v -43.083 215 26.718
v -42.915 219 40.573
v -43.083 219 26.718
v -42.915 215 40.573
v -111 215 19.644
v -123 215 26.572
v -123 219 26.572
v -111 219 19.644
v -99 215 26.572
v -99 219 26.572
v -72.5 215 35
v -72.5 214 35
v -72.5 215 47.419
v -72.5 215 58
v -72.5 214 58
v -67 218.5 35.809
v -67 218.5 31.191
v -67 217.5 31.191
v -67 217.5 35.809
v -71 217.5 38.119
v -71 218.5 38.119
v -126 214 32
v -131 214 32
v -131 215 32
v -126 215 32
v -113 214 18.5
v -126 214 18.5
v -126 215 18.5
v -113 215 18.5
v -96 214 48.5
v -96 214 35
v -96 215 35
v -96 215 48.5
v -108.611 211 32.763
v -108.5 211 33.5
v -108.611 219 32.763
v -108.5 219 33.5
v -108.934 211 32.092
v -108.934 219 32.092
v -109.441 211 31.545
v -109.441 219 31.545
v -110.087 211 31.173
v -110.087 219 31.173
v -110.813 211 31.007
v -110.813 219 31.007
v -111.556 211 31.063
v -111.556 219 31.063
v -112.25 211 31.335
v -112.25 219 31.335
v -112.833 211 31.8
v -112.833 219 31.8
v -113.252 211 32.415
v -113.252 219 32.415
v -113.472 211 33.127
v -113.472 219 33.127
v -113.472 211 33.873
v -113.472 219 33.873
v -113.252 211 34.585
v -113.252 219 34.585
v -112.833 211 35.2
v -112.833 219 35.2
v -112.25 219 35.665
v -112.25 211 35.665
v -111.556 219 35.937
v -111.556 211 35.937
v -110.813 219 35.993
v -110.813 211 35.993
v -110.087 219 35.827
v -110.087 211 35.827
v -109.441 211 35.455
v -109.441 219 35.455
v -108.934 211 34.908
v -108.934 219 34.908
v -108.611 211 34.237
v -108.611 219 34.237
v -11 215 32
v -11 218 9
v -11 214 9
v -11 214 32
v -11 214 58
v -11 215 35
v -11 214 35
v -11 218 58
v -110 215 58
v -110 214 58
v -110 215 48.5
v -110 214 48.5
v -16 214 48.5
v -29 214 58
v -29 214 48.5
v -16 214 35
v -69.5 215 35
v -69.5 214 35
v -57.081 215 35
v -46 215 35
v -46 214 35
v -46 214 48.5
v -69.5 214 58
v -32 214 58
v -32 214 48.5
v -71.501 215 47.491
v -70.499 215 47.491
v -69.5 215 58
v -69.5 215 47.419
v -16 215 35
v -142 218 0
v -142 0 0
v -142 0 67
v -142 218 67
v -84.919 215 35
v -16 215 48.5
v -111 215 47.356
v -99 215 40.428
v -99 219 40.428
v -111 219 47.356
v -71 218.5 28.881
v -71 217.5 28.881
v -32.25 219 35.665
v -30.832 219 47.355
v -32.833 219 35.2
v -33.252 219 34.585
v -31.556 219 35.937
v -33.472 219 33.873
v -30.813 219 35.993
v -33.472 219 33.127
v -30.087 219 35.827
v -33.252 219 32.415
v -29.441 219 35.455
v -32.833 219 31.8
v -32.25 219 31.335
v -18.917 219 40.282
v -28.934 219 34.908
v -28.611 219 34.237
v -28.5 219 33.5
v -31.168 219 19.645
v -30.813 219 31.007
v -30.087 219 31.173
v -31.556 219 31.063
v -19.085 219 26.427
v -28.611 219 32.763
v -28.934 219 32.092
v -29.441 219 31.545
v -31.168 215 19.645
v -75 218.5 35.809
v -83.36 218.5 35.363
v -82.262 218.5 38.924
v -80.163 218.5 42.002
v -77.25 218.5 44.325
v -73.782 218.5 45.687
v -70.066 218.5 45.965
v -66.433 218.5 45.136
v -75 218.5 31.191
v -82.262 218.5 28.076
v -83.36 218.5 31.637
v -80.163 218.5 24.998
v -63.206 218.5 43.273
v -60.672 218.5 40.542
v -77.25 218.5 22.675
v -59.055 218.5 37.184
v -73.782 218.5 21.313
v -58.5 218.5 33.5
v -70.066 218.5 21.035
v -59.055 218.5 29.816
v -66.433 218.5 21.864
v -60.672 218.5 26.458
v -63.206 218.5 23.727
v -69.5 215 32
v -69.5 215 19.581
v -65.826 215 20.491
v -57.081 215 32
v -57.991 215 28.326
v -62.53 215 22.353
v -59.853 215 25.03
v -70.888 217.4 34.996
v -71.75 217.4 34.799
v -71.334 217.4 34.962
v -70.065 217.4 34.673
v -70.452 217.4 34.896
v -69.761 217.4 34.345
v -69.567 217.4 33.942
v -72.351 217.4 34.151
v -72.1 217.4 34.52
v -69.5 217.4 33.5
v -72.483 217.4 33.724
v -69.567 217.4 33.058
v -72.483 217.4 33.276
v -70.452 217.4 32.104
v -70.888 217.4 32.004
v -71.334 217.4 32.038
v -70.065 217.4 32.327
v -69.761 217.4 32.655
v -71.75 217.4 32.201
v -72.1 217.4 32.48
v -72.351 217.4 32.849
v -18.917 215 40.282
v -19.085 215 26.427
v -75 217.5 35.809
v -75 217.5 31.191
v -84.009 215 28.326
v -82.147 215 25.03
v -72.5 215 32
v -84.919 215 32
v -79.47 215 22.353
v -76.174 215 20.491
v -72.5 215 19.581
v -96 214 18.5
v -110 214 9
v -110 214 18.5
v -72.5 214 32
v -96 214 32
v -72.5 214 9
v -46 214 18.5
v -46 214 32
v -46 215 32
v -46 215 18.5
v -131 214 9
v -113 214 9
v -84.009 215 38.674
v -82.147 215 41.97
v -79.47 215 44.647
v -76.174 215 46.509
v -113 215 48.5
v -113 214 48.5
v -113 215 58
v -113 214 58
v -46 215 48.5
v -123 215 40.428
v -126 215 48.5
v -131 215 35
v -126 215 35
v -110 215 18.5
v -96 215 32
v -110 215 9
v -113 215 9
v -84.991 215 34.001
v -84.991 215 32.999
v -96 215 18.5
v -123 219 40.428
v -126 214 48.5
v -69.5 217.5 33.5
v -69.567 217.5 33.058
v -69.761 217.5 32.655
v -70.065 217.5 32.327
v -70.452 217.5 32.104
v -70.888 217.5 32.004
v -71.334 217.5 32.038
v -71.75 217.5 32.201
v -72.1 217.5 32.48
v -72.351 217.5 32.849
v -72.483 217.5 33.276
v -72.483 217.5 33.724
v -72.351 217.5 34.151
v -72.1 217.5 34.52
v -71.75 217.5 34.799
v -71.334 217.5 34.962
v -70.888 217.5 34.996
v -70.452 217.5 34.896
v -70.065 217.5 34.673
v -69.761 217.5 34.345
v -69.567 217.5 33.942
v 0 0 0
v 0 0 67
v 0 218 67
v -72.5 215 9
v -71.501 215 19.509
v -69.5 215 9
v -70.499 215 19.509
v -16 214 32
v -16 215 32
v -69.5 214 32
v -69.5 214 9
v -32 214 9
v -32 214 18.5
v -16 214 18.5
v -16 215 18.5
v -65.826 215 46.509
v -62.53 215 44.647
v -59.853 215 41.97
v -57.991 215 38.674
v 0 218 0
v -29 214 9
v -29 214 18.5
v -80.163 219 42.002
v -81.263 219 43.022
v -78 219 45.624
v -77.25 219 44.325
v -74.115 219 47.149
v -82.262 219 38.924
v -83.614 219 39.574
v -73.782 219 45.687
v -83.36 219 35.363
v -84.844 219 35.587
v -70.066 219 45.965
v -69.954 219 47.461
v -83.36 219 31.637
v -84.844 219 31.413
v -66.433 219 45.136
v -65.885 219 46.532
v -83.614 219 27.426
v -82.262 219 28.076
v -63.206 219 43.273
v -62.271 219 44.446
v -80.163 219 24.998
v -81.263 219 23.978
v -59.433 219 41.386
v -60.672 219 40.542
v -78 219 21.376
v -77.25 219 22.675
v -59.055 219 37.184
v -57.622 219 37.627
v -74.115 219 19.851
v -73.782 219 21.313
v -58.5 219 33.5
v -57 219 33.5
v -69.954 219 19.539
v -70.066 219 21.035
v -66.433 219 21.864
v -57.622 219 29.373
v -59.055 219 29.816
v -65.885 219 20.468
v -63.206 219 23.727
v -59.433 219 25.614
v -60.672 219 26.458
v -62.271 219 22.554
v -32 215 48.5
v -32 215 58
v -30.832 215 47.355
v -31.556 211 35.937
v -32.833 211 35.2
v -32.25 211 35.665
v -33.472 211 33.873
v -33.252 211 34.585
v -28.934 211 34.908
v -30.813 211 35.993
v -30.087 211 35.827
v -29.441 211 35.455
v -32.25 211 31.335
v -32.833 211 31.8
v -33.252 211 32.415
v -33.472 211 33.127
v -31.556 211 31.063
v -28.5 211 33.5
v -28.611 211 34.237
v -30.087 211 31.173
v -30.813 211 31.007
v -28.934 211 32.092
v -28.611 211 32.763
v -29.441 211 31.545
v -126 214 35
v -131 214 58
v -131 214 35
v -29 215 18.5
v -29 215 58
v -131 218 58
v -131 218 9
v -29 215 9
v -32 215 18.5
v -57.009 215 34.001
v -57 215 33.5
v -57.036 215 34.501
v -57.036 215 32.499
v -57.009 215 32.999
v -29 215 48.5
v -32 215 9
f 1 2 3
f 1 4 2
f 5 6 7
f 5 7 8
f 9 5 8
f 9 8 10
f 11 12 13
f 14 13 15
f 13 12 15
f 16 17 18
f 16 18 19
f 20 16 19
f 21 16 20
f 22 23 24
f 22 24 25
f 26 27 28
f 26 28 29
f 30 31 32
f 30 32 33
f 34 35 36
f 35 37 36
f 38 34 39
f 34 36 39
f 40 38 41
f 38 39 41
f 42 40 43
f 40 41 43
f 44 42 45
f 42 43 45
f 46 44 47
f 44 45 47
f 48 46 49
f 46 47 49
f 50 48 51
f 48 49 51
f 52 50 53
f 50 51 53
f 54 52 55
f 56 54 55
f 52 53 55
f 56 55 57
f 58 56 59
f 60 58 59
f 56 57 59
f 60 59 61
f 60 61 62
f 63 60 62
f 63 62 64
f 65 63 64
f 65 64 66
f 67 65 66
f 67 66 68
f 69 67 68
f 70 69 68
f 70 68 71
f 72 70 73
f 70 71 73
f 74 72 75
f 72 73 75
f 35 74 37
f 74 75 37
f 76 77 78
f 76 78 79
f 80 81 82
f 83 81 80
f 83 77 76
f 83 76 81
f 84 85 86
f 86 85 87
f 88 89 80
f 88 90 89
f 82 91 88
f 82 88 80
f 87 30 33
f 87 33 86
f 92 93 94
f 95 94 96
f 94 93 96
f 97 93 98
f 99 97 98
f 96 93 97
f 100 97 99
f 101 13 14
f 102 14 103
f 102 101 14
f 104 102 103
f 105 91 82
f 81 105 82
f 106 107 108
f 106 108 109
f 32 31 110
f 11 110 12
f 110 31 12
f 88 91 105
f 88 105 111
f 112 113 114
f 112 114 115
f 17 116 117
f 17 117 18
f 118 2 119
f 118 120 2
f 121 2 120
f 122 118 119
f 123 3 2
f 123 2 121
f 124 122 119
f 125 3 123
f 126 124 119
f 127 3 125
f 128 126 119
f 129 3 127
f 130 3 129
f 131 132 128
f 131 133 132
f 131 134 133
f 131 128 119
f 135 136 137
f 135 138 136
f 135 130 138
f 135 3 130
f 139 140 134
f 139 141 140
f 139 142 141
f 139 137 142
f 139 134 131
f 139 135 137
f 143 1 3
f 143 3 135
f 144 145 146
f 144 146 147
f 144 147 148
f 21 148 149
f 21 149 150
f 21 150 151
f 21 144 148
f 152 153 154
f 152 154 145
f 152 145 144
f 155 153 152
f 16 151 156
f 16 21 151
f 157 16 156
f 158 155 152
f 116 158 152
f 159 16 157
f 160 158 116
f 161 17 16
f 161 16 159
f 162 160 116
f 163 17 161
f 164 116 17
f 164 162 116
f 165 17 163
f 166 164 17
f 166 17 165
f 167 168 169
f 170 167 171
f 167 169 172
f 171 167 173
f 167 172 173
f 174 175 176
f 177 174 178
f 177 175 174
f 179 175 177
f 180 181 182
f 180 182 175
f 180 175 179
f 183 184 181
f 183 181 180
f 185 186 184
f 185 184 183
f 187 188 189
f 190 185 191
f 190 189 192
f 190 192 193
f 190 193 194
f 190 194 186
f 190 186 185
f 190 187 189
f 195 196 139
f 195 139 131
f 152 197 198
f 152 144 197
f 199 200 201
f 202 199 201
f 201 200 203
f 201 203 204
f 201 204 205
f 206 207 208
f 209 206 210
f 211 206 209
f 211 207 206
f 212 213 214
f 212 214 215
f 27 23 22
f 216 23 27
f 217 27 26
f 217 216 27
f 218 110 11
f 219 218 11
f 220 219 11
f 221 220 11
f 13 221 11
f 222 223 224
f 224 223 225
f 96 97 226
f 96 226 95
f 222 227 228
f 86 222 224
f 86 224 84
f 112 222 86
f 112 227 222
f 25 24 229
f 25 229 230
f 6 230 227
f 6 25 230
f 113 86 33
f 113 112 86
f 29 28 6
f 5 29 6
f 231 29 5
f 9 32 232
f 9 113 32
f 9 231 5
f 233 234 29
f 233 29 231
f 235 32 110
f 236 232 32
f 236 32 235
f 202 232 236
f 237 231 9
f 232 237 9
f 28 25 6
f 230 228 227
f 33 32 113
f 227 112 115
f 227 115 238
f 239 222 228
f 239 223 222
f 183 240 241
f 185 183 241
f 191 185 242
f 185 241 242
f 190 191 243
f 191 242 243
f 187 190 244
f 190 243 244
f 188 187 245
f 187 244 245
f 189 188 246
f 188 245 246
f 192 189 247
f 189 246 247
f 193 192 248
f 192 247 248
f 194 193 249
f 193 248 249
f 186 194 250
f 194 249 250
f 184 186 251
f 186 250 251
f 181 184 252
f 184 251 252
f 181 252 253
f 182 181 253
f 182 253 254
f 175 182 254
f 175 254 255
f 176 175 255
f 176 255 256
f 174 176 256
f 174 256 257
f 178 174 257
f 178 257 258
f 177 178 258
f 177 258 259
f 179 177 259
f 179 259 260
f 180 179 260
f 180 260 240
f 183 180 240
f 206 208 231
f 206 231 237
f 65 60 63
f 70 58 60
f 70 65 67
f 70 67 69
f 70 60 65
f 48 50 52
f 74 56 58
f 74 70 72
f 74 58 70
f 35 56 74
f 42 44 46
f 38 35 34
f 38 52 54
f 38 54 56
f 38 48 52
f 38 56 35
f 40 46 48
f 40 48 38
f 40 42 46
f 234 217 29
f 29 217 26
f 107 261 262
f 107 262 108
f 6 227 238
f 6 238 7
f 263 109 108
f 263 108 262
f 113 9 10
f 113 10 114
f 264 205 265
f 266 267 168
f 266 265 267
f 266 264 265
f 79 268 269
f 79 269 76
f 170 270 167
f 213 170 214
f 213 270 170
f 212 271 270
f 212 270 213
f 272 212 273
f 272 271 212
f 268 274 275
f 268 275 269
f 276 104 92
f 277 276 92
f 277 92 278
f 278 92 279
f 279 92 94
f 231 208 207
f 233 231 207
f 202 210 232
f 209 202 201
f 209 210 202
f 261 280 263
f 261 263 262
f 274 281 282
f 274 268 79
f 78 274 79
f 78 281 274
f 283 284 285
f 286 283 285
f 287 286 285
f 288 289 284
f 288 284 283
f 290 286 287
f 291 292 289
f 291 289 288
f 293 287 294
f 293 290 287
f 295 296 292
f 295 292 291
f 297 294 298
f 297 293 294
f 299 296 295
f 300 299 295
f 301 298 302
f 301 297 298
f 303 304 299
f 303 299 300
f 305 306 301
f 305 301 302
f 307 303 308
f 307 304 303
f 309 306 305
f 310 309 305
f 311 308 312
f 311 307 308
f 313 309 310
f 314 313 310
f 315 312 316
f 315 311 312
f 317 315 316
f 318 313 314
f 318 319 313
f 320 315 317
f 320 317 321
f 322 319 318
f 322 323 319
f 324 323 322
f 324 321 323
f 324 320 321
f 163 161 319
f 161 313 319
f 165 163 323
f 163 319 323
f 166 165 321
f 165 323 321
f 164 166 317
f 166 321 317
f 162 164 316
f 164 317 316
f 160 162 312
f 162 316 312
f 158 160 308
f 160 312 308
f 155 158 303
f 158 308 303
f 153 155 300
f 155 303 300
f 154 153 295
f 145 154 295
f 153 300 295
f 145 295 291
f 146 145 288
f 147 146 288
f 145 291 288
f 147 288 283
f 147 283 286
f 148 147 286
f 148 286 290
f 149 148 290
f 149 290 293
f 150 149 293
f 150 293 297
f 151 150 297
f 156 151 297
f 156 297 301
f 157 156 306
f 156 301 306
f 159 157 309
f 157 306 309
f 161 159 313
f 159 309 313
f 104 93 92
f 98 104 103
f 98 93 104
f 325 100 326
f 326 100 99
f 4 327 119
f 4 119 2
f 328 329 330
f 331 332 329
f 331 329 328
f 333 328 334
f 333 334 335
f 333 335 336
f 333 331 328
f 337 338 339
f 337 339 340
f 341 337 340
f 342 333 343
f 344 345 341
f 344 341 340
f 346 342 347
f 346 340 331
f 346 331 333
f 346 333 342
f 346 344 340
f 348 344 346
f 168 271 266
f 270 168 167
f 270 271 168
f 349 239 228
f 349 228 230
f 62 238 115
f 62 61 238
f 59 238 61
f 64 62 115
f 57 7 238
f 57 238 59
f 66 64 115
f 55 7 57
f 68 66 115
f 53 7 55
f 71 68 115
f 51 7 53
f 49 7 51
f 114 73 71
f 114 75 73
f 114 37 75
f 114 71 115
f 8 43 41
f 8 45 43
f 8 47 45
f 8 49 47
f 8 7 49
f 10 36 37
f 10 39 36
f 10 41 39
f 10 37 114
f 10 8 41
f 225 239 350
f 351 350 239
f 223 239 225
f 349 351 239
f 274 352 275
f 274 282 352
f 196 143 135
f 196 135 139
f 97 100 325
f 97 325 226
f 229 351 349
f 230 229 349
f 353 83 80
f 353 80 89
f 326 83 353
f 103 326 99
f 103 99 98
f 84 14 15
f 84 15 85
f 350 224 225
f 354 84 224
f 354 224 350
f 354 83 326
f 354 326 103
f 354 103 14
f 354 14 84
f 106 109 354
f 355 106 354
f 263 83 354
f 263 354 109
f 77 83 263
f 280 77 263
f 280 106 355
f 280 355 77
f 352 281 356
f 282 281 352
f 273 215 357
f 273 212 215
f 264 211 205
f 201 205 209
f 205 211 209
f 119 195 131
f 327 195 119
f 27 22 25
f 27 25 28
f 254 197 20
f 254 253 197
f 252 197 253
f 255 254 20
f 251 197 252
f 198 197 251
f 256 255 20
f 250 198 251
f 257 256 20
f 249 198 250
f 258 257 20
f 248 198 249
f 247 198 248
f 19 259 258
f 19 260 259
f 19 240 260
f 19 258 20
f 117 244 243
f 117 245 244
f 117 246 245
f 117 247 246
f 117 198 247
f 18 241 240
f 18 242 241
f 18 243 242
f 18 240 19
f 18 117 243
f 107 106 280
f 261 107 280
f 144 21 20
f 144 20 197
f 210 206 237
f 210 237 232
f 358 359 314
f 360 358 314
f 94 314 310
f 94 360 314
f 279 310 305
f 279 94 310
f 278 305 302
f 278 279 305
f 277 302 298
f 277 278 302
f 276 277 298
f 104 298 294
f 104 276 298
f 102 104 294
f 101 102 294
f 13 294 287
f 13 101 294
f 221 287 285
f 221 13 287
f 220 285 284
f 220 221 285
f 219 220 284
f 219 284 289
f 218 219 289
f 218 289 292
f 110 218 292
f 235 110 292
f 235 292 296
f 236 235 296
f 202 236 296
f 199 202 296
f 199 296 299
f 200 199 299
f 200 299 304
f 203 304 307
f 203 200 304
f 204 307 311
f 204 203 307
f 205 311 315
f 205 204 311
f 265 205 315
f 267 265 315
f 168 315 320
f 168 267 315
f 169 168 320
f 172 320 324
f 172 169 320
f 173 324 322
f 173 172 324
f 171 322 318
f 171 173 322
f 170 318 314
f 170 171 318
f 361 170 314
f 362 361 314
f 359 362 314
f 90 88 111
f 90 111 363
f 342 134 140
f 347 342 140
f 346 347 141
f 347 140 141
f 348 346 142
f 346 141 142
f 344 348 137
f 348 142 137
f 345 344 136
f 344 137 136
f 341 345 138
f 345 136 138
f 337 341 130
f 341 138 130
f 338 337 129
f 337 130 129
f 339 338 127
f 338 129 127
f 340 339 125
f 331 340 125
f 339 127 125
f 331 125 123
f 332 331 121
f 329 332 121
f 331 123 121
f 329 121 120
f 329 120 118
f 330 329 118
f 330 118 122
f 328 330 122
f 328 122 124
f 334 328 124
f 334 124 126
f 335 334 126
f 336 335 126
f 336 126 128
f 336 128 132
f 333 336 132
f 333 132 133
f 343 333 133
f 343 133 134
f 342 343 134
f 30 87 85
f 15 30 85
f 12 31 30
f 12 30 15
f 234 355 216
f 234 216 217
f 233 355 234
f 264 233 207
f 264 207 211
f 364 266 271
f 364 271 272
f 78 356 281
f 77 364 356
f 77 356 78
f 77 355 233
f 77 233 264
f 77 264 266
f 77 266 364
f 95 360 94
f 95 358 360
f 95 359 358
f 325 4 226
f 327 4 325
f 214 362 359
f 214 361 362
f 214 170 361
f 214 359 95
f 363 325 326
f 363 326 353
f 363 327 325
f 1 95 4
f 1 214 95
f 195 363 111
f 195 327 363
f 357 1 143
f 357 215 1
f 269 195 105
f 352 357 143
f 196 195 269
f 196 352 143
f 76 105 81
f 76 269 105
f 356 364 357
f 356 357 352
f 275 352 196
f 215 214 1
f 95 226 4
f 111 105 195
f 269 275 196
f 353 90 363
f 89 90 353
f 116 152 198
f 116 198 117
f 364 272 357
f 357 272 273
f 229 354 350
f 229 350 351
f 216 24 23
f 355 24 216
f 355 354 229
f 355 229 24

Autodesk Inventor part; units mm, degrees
ref_plane "YZ Plane" through (0, 0, 0) normal (1, 0, 0) x (0, 1, 0)
ref_plane "XZ Plane" through (0, 0, 0) normal (0, 1, 0) x (-1, 0, 0)
ref_plane "XY Plane" through (0, 0, 0) normal (0, 0, 1) x (1, 0, 0)
sketch "Sketch1" plane through (0, 0, 0) normal (0, 0, 1) x (1, 0, 0)
  line L0 (0, 0) -> (-142, 0)
  line L1 (-142, 0) -> (-142, 218)
  line L2 (-142, 218) -> (0, 218)
  line L3 (0, 218) -> (0, 0)
  dimension "d0" = 142
  dimension "d1" = 218
extrude "Extrusion1" add sketch "Sketch1" along normal blind 67
sketch "Sketch6" plane through (-142, 218, 0) normal (0, 1, 0) x (1, 0, 0)
  line L0 (0, -67) -> (142, -67) projected
  line L1 (142, 0) -> (142, -67) projected
  line L2 (0, 0) -> (142, 0) projected
  line L3 (0, 0) -> (0, -67) projected
  line L4 (11, -9) -> (131, -9)
  line L5 (131, -9) -> (131, -58)
  line L6 (131, -58) -> (11, -58)
  line L7 (11, -58) -> (11, -9)
  dimension "d33" = 67
  dimension "d34" = 142
  dimension "d35" = 11
  dimension "d36" = 11
  dimension "d37" = 9
  dimension "d38" = 9
extrude "Extrusion5" cut sketch "Sketch6" against normal blind 4 contours L4 L5 L6 L7
sketch "Sketch7" plane through (-142, 214, 0) normal (0, 1, 0) x (1, 0, 0)
  line L0 (11, -58) -> (131, -58) projected
  line L1 (131, -58) -> (131, -9) projected
  line L2 (11, -9) -> (131, -9)
  line L3 (131, -9) -> (131, -58)
  line L4 (131, -58) -> (11, -58)
  line L5 (11, -58) -> (11, -9)
  line L6 (11, -9) -> (11, -32)
  line L7 (11, -32) -> (11, -35)
  line L8 (11, -35) -> (11, -58)
  line L9 (11, -32) -> (16, -32)
  line L10 (11, -35) -> (16, -35)
  line L11 (11, -9) -> (29, -9)
  line L12 (29, -9) -> (32, -9)
  line L13 (32, -9) -> (69.5, -9)
  line L14 (69.5, -9) -> (72.5, -9)
  line L15 (72.5, -9) -> (110, -9)
  line L16 (131, -9) -> (113, -9)
  line L17 (113, -9) -> (110, -9)
  line L18 (29, -9) -> (29, -18.5)
  line L19 (32, -18.5) -> (32, -9)
  line L20 (29, -9) -> (32, -9)
  line L21 (32, -58) -> (32, -48.5)
  line L22 (29, -48.5) -> (29, -58)
  line L23 (16, -48.5) -> (16, -35)
  line L24 (16, -32) -> (16, -18.5)
  line L25 (16, -18.5) -> (29, -18.5)
  line L26 (32, -18.5) -> (46, -18.5)
  line L27 (46, -18.5) -> (46, -32)
  line L28 (46, -35) -> (46, -48.5)
  line L29 (69.5, -9) -> (69.5, -32)
  line L30 (69.5, -35) -> (69.5, -58)
  line L31 (72.5, -9) -> (72.5, -32)
  line L32 (72.5, -35) -> (72.5, -58)
  line L33 (46, -32) -> (69.5, -32)
  line L34 (46, -35) -> (69.5, -35)
  line L35 (72.5, -35) -> (96, -35)
  line L36 (126, -35) -> (131, -35)
  line L37 (110, -9) -> (110, -18.5)
  line L38 (110, -48.5) -> (110, -58)
  line L39 (72.5, -32) -> (96, -32)
  line L40 (126, -32) -> (131, -32)
  line L41 (113, -9) -> (113, -18.5)
  line L42 (110, -58) -> (110, -48.5)
  line L43 (110, -18.5) -> (110, -9)
  line L44 (113, -48.5) -> (113, -58)
  line L45 (126, -48.5) -> (113, -48.5)
  line L46 (110, -48.5) -> (96, -48.5)
  line L47 (126, -18.5) -> (126, -32)
  line L48 (126, -35) -> (126, -48.5)
  line L49 (96, -48.5) -> (96, -35)
  line L50 (96, -32) -> (96, -18.5)
  line L51 (96, -18.5) -> (110, -18.5)
  line L52 (113, -18.5) -> (126, -18.5)
  line L53 (46, -48.5) -> (32, -48.5)
  line L54 (29, -48.5) -> (16, -48.5)
  line L55 (11, -32) -> (16, -32)
  line L56 (16, -18.5) -> (29, -18.5)
  line L57 (29, -9) -> (32, -9)
  line L58 (32, -18.5) -> (46, -18.5)
  line L59 (46, -32) -> (69.5, -32)
  line L60 (69.5, -9) -> (72.5, -9)
  line L61 (72.5, -32) -> (96, -32)
  line L62 (96, -18.5) -> (110, -18.5)
  line L63 (110, -9) -> (113, -9)
  line L64 (113, -18.5) -> (126, -18.5)
  line L65 (126, -32) -> (131, -32)
  line L66 (131, -35) -> (126, -35)
  line L67 (126, -48.5) -> (113, -48.5)
  line L68 (113, -58) -> (110, -58)
  line L69 (110, -48.5) -> (96, -48.5)
  line L70 (96, -35) -> (72.5, -35)
  line L71 (72.5, -58) -> (69.5, -58)
  line L72 (69.5, -35) -> (46, -35)
  line L73 (46, -48.5) -> (32, -48.5)
  line L74 (32, -58) -> (29, -58)
  line L75 (29, -48.5) -> (16, -48.5)
  line L76 (16, -35) -> (11, -35)
  point P0 (142, 0)
extrude "Extrusion6" add sketch "Sketch7" along normal blind 1 contours L22 L54 L23 L10 L5 L9 L24 L25 L18 L2 L19 L26 L27 L33 L29 L31 L39 L50 L51 L37 L41 L52 L47 L40 L1 L36 L48 L45 L44 L0 L38 L46 L49 L35 L32 L30 L34 L28 L53 L21
sketch "Sketch8" plane through (-142, 215, 0) normal (0, 1, 0) x (1, 0, 0)
  line L0 (126, -18.5) -> (126, -32) projected
  line L1 (113, -18.5) -> (126, -18.5) projected
  line L2 (32, -18.5) -> (46, -18.5) projected
  line L3 (16, -32) -> (16, -18.5) projected
  line L4 (31, -47.3564) -> (19, -40.4282)
  line L5 (19, -40.4282) -> (19, -26.5718)
  line L6 (19, -26.5718) -> (31, -19.6436)
  line L7 (31, -19.6436) -> (43, -26.5718)
  line L8 (43, -26.5718) -> (43, -40.4282)
  line L9 (43, -40.4282) -> (31, -47.3564)
  line L10 (110.8321, -19.6446) -> (122.9152, -26.4269)
  line L11 (122.9152, -26.4269) -> (123.0831, -40.2823)
  line L12 (123.0831, -40.2823) -> (111.1679, -47.3554)
  line L13 (111.1679, -47.3554) -> (99.0848, -40.5731)
  line L14 (99.0848, -40.5731) -> (98.9169, -26.7177)
  line L15 (98.9169, -26.7177) -> (110.8321, -19.6446)
  circle A0 centre (111, -33.5) radius 3.75
  circle A1 centre (31, -33.5) radius 3.75
  circle A2 centre (71, -33.5) radius 14
  point P0 (142, 0)
  dimension "d62" = 15
  dimension "d63" = 15
  dimension "d64" = 15
  dimension "d65" = 15
  dimension "d66" = 12
  dimension "d67" = 12
  dimension "d69" = 7.5
  dimension "d70" = 7.5
  dimension "d71" = 28
extrude "Extrusion7" add sketch "Sketch8" along normal blind 4 contours L4 L5 L6 L7 L8 L9 | L10 L11 L12 L13 L14 L15 | A0 | A1 | A2
sketch "Sketch9" plane through (-71, 219, 33.5) normal (0, 1, 0) x (1, 0, 0)
  circle A0 centre (0, 0) radius 14 projected
  circle A1 centre (0, 0) radius 12.5
  point P0 (71, 33.5)
  dimension "d74" = 25
extrude "Extrusion8" cut sketch "Sketch9" against normal blind 0.5 contours A1
sketch "Sketch10" plane through (-71, 218.5, 33.5) normal (0, 1, 0) x (1, 0, 0)
  circle A0 centre (0, 0) radius 12.5 projected
  line L0 (0, 4.6188) -> (4, 2.3094)
  line L1 (4, 2.3094) -> (4, -2.3094)
  line L2 (4, -2.3094) -> (0, -4.6188)
  line L3 (0, -4.6188) -> (-4, -2.3094)
  line L4 (-4, -2.3094) -> (-4, 2.3094)
  line L5 (-4, 2.3094) -> (0, 4.6188)
  circle A1 centre (0, 0) radius 1.5
  point P0 (71, 33.5)
  dimension "d77" = 4
  dimension "d78" = 3
extrude "Extrusion9" cut sketch "Sketch10" against normal blind 1 contours L0 L1 L2 L3 L4 L5 | A1
sketch "Sketch11" plane through (-71, 217.5, 33.5) normal (0, 1, 0) x (1, 0, 0)
  circle A0 centre (0, 0) radius 1.5
  point P0 (71, 33.5)
  dimension "d81" = 3
extrude "Extrusion10" cut sketch "Sketch11" against normal blind 0.1
sketch "Sketch13" plane through (-142, 219, 0) normal (0, 1, 0) x (1, 0, 0)
  circle A0 centre (31, -33.5) radius 2.5
  point P0 (142, 0)
  dimension "d84" = 5
extrude "Extrusion11" cut sketch "Sketch13" against normal blind 8
sketch "Sketch14" plane through (-142, 219, 0) normal (0, 1, 0) x (1, 0, 0)
  circle A0 centre (111, -33.5) radius 2.5
  point P0 (142, 0)
  dimension "d87" = 5
extrude "Extrusion12" cut sketch "Sketch14" against normal blind 8
equation "\"BendRadius\" = Thickness"
equation "\"BendReliefWidth\" = Thickness"
equation "\"BendReliefDepth\" = 0.5 * Thickness"
equation "\"CornerReliefSize\" = 4 * Thickness"
equation "\"MinimumRemnant\" = 2 * Thickness"
equation "\"TransitionRadius\" = BendRadius"
equation "\"JacobiRadiusSize\" = Thickness"
equation "\"GapSize\" = Thickness"
equation "\"Thickness\" = 0.5"
properties part number "CALB100AH final"
